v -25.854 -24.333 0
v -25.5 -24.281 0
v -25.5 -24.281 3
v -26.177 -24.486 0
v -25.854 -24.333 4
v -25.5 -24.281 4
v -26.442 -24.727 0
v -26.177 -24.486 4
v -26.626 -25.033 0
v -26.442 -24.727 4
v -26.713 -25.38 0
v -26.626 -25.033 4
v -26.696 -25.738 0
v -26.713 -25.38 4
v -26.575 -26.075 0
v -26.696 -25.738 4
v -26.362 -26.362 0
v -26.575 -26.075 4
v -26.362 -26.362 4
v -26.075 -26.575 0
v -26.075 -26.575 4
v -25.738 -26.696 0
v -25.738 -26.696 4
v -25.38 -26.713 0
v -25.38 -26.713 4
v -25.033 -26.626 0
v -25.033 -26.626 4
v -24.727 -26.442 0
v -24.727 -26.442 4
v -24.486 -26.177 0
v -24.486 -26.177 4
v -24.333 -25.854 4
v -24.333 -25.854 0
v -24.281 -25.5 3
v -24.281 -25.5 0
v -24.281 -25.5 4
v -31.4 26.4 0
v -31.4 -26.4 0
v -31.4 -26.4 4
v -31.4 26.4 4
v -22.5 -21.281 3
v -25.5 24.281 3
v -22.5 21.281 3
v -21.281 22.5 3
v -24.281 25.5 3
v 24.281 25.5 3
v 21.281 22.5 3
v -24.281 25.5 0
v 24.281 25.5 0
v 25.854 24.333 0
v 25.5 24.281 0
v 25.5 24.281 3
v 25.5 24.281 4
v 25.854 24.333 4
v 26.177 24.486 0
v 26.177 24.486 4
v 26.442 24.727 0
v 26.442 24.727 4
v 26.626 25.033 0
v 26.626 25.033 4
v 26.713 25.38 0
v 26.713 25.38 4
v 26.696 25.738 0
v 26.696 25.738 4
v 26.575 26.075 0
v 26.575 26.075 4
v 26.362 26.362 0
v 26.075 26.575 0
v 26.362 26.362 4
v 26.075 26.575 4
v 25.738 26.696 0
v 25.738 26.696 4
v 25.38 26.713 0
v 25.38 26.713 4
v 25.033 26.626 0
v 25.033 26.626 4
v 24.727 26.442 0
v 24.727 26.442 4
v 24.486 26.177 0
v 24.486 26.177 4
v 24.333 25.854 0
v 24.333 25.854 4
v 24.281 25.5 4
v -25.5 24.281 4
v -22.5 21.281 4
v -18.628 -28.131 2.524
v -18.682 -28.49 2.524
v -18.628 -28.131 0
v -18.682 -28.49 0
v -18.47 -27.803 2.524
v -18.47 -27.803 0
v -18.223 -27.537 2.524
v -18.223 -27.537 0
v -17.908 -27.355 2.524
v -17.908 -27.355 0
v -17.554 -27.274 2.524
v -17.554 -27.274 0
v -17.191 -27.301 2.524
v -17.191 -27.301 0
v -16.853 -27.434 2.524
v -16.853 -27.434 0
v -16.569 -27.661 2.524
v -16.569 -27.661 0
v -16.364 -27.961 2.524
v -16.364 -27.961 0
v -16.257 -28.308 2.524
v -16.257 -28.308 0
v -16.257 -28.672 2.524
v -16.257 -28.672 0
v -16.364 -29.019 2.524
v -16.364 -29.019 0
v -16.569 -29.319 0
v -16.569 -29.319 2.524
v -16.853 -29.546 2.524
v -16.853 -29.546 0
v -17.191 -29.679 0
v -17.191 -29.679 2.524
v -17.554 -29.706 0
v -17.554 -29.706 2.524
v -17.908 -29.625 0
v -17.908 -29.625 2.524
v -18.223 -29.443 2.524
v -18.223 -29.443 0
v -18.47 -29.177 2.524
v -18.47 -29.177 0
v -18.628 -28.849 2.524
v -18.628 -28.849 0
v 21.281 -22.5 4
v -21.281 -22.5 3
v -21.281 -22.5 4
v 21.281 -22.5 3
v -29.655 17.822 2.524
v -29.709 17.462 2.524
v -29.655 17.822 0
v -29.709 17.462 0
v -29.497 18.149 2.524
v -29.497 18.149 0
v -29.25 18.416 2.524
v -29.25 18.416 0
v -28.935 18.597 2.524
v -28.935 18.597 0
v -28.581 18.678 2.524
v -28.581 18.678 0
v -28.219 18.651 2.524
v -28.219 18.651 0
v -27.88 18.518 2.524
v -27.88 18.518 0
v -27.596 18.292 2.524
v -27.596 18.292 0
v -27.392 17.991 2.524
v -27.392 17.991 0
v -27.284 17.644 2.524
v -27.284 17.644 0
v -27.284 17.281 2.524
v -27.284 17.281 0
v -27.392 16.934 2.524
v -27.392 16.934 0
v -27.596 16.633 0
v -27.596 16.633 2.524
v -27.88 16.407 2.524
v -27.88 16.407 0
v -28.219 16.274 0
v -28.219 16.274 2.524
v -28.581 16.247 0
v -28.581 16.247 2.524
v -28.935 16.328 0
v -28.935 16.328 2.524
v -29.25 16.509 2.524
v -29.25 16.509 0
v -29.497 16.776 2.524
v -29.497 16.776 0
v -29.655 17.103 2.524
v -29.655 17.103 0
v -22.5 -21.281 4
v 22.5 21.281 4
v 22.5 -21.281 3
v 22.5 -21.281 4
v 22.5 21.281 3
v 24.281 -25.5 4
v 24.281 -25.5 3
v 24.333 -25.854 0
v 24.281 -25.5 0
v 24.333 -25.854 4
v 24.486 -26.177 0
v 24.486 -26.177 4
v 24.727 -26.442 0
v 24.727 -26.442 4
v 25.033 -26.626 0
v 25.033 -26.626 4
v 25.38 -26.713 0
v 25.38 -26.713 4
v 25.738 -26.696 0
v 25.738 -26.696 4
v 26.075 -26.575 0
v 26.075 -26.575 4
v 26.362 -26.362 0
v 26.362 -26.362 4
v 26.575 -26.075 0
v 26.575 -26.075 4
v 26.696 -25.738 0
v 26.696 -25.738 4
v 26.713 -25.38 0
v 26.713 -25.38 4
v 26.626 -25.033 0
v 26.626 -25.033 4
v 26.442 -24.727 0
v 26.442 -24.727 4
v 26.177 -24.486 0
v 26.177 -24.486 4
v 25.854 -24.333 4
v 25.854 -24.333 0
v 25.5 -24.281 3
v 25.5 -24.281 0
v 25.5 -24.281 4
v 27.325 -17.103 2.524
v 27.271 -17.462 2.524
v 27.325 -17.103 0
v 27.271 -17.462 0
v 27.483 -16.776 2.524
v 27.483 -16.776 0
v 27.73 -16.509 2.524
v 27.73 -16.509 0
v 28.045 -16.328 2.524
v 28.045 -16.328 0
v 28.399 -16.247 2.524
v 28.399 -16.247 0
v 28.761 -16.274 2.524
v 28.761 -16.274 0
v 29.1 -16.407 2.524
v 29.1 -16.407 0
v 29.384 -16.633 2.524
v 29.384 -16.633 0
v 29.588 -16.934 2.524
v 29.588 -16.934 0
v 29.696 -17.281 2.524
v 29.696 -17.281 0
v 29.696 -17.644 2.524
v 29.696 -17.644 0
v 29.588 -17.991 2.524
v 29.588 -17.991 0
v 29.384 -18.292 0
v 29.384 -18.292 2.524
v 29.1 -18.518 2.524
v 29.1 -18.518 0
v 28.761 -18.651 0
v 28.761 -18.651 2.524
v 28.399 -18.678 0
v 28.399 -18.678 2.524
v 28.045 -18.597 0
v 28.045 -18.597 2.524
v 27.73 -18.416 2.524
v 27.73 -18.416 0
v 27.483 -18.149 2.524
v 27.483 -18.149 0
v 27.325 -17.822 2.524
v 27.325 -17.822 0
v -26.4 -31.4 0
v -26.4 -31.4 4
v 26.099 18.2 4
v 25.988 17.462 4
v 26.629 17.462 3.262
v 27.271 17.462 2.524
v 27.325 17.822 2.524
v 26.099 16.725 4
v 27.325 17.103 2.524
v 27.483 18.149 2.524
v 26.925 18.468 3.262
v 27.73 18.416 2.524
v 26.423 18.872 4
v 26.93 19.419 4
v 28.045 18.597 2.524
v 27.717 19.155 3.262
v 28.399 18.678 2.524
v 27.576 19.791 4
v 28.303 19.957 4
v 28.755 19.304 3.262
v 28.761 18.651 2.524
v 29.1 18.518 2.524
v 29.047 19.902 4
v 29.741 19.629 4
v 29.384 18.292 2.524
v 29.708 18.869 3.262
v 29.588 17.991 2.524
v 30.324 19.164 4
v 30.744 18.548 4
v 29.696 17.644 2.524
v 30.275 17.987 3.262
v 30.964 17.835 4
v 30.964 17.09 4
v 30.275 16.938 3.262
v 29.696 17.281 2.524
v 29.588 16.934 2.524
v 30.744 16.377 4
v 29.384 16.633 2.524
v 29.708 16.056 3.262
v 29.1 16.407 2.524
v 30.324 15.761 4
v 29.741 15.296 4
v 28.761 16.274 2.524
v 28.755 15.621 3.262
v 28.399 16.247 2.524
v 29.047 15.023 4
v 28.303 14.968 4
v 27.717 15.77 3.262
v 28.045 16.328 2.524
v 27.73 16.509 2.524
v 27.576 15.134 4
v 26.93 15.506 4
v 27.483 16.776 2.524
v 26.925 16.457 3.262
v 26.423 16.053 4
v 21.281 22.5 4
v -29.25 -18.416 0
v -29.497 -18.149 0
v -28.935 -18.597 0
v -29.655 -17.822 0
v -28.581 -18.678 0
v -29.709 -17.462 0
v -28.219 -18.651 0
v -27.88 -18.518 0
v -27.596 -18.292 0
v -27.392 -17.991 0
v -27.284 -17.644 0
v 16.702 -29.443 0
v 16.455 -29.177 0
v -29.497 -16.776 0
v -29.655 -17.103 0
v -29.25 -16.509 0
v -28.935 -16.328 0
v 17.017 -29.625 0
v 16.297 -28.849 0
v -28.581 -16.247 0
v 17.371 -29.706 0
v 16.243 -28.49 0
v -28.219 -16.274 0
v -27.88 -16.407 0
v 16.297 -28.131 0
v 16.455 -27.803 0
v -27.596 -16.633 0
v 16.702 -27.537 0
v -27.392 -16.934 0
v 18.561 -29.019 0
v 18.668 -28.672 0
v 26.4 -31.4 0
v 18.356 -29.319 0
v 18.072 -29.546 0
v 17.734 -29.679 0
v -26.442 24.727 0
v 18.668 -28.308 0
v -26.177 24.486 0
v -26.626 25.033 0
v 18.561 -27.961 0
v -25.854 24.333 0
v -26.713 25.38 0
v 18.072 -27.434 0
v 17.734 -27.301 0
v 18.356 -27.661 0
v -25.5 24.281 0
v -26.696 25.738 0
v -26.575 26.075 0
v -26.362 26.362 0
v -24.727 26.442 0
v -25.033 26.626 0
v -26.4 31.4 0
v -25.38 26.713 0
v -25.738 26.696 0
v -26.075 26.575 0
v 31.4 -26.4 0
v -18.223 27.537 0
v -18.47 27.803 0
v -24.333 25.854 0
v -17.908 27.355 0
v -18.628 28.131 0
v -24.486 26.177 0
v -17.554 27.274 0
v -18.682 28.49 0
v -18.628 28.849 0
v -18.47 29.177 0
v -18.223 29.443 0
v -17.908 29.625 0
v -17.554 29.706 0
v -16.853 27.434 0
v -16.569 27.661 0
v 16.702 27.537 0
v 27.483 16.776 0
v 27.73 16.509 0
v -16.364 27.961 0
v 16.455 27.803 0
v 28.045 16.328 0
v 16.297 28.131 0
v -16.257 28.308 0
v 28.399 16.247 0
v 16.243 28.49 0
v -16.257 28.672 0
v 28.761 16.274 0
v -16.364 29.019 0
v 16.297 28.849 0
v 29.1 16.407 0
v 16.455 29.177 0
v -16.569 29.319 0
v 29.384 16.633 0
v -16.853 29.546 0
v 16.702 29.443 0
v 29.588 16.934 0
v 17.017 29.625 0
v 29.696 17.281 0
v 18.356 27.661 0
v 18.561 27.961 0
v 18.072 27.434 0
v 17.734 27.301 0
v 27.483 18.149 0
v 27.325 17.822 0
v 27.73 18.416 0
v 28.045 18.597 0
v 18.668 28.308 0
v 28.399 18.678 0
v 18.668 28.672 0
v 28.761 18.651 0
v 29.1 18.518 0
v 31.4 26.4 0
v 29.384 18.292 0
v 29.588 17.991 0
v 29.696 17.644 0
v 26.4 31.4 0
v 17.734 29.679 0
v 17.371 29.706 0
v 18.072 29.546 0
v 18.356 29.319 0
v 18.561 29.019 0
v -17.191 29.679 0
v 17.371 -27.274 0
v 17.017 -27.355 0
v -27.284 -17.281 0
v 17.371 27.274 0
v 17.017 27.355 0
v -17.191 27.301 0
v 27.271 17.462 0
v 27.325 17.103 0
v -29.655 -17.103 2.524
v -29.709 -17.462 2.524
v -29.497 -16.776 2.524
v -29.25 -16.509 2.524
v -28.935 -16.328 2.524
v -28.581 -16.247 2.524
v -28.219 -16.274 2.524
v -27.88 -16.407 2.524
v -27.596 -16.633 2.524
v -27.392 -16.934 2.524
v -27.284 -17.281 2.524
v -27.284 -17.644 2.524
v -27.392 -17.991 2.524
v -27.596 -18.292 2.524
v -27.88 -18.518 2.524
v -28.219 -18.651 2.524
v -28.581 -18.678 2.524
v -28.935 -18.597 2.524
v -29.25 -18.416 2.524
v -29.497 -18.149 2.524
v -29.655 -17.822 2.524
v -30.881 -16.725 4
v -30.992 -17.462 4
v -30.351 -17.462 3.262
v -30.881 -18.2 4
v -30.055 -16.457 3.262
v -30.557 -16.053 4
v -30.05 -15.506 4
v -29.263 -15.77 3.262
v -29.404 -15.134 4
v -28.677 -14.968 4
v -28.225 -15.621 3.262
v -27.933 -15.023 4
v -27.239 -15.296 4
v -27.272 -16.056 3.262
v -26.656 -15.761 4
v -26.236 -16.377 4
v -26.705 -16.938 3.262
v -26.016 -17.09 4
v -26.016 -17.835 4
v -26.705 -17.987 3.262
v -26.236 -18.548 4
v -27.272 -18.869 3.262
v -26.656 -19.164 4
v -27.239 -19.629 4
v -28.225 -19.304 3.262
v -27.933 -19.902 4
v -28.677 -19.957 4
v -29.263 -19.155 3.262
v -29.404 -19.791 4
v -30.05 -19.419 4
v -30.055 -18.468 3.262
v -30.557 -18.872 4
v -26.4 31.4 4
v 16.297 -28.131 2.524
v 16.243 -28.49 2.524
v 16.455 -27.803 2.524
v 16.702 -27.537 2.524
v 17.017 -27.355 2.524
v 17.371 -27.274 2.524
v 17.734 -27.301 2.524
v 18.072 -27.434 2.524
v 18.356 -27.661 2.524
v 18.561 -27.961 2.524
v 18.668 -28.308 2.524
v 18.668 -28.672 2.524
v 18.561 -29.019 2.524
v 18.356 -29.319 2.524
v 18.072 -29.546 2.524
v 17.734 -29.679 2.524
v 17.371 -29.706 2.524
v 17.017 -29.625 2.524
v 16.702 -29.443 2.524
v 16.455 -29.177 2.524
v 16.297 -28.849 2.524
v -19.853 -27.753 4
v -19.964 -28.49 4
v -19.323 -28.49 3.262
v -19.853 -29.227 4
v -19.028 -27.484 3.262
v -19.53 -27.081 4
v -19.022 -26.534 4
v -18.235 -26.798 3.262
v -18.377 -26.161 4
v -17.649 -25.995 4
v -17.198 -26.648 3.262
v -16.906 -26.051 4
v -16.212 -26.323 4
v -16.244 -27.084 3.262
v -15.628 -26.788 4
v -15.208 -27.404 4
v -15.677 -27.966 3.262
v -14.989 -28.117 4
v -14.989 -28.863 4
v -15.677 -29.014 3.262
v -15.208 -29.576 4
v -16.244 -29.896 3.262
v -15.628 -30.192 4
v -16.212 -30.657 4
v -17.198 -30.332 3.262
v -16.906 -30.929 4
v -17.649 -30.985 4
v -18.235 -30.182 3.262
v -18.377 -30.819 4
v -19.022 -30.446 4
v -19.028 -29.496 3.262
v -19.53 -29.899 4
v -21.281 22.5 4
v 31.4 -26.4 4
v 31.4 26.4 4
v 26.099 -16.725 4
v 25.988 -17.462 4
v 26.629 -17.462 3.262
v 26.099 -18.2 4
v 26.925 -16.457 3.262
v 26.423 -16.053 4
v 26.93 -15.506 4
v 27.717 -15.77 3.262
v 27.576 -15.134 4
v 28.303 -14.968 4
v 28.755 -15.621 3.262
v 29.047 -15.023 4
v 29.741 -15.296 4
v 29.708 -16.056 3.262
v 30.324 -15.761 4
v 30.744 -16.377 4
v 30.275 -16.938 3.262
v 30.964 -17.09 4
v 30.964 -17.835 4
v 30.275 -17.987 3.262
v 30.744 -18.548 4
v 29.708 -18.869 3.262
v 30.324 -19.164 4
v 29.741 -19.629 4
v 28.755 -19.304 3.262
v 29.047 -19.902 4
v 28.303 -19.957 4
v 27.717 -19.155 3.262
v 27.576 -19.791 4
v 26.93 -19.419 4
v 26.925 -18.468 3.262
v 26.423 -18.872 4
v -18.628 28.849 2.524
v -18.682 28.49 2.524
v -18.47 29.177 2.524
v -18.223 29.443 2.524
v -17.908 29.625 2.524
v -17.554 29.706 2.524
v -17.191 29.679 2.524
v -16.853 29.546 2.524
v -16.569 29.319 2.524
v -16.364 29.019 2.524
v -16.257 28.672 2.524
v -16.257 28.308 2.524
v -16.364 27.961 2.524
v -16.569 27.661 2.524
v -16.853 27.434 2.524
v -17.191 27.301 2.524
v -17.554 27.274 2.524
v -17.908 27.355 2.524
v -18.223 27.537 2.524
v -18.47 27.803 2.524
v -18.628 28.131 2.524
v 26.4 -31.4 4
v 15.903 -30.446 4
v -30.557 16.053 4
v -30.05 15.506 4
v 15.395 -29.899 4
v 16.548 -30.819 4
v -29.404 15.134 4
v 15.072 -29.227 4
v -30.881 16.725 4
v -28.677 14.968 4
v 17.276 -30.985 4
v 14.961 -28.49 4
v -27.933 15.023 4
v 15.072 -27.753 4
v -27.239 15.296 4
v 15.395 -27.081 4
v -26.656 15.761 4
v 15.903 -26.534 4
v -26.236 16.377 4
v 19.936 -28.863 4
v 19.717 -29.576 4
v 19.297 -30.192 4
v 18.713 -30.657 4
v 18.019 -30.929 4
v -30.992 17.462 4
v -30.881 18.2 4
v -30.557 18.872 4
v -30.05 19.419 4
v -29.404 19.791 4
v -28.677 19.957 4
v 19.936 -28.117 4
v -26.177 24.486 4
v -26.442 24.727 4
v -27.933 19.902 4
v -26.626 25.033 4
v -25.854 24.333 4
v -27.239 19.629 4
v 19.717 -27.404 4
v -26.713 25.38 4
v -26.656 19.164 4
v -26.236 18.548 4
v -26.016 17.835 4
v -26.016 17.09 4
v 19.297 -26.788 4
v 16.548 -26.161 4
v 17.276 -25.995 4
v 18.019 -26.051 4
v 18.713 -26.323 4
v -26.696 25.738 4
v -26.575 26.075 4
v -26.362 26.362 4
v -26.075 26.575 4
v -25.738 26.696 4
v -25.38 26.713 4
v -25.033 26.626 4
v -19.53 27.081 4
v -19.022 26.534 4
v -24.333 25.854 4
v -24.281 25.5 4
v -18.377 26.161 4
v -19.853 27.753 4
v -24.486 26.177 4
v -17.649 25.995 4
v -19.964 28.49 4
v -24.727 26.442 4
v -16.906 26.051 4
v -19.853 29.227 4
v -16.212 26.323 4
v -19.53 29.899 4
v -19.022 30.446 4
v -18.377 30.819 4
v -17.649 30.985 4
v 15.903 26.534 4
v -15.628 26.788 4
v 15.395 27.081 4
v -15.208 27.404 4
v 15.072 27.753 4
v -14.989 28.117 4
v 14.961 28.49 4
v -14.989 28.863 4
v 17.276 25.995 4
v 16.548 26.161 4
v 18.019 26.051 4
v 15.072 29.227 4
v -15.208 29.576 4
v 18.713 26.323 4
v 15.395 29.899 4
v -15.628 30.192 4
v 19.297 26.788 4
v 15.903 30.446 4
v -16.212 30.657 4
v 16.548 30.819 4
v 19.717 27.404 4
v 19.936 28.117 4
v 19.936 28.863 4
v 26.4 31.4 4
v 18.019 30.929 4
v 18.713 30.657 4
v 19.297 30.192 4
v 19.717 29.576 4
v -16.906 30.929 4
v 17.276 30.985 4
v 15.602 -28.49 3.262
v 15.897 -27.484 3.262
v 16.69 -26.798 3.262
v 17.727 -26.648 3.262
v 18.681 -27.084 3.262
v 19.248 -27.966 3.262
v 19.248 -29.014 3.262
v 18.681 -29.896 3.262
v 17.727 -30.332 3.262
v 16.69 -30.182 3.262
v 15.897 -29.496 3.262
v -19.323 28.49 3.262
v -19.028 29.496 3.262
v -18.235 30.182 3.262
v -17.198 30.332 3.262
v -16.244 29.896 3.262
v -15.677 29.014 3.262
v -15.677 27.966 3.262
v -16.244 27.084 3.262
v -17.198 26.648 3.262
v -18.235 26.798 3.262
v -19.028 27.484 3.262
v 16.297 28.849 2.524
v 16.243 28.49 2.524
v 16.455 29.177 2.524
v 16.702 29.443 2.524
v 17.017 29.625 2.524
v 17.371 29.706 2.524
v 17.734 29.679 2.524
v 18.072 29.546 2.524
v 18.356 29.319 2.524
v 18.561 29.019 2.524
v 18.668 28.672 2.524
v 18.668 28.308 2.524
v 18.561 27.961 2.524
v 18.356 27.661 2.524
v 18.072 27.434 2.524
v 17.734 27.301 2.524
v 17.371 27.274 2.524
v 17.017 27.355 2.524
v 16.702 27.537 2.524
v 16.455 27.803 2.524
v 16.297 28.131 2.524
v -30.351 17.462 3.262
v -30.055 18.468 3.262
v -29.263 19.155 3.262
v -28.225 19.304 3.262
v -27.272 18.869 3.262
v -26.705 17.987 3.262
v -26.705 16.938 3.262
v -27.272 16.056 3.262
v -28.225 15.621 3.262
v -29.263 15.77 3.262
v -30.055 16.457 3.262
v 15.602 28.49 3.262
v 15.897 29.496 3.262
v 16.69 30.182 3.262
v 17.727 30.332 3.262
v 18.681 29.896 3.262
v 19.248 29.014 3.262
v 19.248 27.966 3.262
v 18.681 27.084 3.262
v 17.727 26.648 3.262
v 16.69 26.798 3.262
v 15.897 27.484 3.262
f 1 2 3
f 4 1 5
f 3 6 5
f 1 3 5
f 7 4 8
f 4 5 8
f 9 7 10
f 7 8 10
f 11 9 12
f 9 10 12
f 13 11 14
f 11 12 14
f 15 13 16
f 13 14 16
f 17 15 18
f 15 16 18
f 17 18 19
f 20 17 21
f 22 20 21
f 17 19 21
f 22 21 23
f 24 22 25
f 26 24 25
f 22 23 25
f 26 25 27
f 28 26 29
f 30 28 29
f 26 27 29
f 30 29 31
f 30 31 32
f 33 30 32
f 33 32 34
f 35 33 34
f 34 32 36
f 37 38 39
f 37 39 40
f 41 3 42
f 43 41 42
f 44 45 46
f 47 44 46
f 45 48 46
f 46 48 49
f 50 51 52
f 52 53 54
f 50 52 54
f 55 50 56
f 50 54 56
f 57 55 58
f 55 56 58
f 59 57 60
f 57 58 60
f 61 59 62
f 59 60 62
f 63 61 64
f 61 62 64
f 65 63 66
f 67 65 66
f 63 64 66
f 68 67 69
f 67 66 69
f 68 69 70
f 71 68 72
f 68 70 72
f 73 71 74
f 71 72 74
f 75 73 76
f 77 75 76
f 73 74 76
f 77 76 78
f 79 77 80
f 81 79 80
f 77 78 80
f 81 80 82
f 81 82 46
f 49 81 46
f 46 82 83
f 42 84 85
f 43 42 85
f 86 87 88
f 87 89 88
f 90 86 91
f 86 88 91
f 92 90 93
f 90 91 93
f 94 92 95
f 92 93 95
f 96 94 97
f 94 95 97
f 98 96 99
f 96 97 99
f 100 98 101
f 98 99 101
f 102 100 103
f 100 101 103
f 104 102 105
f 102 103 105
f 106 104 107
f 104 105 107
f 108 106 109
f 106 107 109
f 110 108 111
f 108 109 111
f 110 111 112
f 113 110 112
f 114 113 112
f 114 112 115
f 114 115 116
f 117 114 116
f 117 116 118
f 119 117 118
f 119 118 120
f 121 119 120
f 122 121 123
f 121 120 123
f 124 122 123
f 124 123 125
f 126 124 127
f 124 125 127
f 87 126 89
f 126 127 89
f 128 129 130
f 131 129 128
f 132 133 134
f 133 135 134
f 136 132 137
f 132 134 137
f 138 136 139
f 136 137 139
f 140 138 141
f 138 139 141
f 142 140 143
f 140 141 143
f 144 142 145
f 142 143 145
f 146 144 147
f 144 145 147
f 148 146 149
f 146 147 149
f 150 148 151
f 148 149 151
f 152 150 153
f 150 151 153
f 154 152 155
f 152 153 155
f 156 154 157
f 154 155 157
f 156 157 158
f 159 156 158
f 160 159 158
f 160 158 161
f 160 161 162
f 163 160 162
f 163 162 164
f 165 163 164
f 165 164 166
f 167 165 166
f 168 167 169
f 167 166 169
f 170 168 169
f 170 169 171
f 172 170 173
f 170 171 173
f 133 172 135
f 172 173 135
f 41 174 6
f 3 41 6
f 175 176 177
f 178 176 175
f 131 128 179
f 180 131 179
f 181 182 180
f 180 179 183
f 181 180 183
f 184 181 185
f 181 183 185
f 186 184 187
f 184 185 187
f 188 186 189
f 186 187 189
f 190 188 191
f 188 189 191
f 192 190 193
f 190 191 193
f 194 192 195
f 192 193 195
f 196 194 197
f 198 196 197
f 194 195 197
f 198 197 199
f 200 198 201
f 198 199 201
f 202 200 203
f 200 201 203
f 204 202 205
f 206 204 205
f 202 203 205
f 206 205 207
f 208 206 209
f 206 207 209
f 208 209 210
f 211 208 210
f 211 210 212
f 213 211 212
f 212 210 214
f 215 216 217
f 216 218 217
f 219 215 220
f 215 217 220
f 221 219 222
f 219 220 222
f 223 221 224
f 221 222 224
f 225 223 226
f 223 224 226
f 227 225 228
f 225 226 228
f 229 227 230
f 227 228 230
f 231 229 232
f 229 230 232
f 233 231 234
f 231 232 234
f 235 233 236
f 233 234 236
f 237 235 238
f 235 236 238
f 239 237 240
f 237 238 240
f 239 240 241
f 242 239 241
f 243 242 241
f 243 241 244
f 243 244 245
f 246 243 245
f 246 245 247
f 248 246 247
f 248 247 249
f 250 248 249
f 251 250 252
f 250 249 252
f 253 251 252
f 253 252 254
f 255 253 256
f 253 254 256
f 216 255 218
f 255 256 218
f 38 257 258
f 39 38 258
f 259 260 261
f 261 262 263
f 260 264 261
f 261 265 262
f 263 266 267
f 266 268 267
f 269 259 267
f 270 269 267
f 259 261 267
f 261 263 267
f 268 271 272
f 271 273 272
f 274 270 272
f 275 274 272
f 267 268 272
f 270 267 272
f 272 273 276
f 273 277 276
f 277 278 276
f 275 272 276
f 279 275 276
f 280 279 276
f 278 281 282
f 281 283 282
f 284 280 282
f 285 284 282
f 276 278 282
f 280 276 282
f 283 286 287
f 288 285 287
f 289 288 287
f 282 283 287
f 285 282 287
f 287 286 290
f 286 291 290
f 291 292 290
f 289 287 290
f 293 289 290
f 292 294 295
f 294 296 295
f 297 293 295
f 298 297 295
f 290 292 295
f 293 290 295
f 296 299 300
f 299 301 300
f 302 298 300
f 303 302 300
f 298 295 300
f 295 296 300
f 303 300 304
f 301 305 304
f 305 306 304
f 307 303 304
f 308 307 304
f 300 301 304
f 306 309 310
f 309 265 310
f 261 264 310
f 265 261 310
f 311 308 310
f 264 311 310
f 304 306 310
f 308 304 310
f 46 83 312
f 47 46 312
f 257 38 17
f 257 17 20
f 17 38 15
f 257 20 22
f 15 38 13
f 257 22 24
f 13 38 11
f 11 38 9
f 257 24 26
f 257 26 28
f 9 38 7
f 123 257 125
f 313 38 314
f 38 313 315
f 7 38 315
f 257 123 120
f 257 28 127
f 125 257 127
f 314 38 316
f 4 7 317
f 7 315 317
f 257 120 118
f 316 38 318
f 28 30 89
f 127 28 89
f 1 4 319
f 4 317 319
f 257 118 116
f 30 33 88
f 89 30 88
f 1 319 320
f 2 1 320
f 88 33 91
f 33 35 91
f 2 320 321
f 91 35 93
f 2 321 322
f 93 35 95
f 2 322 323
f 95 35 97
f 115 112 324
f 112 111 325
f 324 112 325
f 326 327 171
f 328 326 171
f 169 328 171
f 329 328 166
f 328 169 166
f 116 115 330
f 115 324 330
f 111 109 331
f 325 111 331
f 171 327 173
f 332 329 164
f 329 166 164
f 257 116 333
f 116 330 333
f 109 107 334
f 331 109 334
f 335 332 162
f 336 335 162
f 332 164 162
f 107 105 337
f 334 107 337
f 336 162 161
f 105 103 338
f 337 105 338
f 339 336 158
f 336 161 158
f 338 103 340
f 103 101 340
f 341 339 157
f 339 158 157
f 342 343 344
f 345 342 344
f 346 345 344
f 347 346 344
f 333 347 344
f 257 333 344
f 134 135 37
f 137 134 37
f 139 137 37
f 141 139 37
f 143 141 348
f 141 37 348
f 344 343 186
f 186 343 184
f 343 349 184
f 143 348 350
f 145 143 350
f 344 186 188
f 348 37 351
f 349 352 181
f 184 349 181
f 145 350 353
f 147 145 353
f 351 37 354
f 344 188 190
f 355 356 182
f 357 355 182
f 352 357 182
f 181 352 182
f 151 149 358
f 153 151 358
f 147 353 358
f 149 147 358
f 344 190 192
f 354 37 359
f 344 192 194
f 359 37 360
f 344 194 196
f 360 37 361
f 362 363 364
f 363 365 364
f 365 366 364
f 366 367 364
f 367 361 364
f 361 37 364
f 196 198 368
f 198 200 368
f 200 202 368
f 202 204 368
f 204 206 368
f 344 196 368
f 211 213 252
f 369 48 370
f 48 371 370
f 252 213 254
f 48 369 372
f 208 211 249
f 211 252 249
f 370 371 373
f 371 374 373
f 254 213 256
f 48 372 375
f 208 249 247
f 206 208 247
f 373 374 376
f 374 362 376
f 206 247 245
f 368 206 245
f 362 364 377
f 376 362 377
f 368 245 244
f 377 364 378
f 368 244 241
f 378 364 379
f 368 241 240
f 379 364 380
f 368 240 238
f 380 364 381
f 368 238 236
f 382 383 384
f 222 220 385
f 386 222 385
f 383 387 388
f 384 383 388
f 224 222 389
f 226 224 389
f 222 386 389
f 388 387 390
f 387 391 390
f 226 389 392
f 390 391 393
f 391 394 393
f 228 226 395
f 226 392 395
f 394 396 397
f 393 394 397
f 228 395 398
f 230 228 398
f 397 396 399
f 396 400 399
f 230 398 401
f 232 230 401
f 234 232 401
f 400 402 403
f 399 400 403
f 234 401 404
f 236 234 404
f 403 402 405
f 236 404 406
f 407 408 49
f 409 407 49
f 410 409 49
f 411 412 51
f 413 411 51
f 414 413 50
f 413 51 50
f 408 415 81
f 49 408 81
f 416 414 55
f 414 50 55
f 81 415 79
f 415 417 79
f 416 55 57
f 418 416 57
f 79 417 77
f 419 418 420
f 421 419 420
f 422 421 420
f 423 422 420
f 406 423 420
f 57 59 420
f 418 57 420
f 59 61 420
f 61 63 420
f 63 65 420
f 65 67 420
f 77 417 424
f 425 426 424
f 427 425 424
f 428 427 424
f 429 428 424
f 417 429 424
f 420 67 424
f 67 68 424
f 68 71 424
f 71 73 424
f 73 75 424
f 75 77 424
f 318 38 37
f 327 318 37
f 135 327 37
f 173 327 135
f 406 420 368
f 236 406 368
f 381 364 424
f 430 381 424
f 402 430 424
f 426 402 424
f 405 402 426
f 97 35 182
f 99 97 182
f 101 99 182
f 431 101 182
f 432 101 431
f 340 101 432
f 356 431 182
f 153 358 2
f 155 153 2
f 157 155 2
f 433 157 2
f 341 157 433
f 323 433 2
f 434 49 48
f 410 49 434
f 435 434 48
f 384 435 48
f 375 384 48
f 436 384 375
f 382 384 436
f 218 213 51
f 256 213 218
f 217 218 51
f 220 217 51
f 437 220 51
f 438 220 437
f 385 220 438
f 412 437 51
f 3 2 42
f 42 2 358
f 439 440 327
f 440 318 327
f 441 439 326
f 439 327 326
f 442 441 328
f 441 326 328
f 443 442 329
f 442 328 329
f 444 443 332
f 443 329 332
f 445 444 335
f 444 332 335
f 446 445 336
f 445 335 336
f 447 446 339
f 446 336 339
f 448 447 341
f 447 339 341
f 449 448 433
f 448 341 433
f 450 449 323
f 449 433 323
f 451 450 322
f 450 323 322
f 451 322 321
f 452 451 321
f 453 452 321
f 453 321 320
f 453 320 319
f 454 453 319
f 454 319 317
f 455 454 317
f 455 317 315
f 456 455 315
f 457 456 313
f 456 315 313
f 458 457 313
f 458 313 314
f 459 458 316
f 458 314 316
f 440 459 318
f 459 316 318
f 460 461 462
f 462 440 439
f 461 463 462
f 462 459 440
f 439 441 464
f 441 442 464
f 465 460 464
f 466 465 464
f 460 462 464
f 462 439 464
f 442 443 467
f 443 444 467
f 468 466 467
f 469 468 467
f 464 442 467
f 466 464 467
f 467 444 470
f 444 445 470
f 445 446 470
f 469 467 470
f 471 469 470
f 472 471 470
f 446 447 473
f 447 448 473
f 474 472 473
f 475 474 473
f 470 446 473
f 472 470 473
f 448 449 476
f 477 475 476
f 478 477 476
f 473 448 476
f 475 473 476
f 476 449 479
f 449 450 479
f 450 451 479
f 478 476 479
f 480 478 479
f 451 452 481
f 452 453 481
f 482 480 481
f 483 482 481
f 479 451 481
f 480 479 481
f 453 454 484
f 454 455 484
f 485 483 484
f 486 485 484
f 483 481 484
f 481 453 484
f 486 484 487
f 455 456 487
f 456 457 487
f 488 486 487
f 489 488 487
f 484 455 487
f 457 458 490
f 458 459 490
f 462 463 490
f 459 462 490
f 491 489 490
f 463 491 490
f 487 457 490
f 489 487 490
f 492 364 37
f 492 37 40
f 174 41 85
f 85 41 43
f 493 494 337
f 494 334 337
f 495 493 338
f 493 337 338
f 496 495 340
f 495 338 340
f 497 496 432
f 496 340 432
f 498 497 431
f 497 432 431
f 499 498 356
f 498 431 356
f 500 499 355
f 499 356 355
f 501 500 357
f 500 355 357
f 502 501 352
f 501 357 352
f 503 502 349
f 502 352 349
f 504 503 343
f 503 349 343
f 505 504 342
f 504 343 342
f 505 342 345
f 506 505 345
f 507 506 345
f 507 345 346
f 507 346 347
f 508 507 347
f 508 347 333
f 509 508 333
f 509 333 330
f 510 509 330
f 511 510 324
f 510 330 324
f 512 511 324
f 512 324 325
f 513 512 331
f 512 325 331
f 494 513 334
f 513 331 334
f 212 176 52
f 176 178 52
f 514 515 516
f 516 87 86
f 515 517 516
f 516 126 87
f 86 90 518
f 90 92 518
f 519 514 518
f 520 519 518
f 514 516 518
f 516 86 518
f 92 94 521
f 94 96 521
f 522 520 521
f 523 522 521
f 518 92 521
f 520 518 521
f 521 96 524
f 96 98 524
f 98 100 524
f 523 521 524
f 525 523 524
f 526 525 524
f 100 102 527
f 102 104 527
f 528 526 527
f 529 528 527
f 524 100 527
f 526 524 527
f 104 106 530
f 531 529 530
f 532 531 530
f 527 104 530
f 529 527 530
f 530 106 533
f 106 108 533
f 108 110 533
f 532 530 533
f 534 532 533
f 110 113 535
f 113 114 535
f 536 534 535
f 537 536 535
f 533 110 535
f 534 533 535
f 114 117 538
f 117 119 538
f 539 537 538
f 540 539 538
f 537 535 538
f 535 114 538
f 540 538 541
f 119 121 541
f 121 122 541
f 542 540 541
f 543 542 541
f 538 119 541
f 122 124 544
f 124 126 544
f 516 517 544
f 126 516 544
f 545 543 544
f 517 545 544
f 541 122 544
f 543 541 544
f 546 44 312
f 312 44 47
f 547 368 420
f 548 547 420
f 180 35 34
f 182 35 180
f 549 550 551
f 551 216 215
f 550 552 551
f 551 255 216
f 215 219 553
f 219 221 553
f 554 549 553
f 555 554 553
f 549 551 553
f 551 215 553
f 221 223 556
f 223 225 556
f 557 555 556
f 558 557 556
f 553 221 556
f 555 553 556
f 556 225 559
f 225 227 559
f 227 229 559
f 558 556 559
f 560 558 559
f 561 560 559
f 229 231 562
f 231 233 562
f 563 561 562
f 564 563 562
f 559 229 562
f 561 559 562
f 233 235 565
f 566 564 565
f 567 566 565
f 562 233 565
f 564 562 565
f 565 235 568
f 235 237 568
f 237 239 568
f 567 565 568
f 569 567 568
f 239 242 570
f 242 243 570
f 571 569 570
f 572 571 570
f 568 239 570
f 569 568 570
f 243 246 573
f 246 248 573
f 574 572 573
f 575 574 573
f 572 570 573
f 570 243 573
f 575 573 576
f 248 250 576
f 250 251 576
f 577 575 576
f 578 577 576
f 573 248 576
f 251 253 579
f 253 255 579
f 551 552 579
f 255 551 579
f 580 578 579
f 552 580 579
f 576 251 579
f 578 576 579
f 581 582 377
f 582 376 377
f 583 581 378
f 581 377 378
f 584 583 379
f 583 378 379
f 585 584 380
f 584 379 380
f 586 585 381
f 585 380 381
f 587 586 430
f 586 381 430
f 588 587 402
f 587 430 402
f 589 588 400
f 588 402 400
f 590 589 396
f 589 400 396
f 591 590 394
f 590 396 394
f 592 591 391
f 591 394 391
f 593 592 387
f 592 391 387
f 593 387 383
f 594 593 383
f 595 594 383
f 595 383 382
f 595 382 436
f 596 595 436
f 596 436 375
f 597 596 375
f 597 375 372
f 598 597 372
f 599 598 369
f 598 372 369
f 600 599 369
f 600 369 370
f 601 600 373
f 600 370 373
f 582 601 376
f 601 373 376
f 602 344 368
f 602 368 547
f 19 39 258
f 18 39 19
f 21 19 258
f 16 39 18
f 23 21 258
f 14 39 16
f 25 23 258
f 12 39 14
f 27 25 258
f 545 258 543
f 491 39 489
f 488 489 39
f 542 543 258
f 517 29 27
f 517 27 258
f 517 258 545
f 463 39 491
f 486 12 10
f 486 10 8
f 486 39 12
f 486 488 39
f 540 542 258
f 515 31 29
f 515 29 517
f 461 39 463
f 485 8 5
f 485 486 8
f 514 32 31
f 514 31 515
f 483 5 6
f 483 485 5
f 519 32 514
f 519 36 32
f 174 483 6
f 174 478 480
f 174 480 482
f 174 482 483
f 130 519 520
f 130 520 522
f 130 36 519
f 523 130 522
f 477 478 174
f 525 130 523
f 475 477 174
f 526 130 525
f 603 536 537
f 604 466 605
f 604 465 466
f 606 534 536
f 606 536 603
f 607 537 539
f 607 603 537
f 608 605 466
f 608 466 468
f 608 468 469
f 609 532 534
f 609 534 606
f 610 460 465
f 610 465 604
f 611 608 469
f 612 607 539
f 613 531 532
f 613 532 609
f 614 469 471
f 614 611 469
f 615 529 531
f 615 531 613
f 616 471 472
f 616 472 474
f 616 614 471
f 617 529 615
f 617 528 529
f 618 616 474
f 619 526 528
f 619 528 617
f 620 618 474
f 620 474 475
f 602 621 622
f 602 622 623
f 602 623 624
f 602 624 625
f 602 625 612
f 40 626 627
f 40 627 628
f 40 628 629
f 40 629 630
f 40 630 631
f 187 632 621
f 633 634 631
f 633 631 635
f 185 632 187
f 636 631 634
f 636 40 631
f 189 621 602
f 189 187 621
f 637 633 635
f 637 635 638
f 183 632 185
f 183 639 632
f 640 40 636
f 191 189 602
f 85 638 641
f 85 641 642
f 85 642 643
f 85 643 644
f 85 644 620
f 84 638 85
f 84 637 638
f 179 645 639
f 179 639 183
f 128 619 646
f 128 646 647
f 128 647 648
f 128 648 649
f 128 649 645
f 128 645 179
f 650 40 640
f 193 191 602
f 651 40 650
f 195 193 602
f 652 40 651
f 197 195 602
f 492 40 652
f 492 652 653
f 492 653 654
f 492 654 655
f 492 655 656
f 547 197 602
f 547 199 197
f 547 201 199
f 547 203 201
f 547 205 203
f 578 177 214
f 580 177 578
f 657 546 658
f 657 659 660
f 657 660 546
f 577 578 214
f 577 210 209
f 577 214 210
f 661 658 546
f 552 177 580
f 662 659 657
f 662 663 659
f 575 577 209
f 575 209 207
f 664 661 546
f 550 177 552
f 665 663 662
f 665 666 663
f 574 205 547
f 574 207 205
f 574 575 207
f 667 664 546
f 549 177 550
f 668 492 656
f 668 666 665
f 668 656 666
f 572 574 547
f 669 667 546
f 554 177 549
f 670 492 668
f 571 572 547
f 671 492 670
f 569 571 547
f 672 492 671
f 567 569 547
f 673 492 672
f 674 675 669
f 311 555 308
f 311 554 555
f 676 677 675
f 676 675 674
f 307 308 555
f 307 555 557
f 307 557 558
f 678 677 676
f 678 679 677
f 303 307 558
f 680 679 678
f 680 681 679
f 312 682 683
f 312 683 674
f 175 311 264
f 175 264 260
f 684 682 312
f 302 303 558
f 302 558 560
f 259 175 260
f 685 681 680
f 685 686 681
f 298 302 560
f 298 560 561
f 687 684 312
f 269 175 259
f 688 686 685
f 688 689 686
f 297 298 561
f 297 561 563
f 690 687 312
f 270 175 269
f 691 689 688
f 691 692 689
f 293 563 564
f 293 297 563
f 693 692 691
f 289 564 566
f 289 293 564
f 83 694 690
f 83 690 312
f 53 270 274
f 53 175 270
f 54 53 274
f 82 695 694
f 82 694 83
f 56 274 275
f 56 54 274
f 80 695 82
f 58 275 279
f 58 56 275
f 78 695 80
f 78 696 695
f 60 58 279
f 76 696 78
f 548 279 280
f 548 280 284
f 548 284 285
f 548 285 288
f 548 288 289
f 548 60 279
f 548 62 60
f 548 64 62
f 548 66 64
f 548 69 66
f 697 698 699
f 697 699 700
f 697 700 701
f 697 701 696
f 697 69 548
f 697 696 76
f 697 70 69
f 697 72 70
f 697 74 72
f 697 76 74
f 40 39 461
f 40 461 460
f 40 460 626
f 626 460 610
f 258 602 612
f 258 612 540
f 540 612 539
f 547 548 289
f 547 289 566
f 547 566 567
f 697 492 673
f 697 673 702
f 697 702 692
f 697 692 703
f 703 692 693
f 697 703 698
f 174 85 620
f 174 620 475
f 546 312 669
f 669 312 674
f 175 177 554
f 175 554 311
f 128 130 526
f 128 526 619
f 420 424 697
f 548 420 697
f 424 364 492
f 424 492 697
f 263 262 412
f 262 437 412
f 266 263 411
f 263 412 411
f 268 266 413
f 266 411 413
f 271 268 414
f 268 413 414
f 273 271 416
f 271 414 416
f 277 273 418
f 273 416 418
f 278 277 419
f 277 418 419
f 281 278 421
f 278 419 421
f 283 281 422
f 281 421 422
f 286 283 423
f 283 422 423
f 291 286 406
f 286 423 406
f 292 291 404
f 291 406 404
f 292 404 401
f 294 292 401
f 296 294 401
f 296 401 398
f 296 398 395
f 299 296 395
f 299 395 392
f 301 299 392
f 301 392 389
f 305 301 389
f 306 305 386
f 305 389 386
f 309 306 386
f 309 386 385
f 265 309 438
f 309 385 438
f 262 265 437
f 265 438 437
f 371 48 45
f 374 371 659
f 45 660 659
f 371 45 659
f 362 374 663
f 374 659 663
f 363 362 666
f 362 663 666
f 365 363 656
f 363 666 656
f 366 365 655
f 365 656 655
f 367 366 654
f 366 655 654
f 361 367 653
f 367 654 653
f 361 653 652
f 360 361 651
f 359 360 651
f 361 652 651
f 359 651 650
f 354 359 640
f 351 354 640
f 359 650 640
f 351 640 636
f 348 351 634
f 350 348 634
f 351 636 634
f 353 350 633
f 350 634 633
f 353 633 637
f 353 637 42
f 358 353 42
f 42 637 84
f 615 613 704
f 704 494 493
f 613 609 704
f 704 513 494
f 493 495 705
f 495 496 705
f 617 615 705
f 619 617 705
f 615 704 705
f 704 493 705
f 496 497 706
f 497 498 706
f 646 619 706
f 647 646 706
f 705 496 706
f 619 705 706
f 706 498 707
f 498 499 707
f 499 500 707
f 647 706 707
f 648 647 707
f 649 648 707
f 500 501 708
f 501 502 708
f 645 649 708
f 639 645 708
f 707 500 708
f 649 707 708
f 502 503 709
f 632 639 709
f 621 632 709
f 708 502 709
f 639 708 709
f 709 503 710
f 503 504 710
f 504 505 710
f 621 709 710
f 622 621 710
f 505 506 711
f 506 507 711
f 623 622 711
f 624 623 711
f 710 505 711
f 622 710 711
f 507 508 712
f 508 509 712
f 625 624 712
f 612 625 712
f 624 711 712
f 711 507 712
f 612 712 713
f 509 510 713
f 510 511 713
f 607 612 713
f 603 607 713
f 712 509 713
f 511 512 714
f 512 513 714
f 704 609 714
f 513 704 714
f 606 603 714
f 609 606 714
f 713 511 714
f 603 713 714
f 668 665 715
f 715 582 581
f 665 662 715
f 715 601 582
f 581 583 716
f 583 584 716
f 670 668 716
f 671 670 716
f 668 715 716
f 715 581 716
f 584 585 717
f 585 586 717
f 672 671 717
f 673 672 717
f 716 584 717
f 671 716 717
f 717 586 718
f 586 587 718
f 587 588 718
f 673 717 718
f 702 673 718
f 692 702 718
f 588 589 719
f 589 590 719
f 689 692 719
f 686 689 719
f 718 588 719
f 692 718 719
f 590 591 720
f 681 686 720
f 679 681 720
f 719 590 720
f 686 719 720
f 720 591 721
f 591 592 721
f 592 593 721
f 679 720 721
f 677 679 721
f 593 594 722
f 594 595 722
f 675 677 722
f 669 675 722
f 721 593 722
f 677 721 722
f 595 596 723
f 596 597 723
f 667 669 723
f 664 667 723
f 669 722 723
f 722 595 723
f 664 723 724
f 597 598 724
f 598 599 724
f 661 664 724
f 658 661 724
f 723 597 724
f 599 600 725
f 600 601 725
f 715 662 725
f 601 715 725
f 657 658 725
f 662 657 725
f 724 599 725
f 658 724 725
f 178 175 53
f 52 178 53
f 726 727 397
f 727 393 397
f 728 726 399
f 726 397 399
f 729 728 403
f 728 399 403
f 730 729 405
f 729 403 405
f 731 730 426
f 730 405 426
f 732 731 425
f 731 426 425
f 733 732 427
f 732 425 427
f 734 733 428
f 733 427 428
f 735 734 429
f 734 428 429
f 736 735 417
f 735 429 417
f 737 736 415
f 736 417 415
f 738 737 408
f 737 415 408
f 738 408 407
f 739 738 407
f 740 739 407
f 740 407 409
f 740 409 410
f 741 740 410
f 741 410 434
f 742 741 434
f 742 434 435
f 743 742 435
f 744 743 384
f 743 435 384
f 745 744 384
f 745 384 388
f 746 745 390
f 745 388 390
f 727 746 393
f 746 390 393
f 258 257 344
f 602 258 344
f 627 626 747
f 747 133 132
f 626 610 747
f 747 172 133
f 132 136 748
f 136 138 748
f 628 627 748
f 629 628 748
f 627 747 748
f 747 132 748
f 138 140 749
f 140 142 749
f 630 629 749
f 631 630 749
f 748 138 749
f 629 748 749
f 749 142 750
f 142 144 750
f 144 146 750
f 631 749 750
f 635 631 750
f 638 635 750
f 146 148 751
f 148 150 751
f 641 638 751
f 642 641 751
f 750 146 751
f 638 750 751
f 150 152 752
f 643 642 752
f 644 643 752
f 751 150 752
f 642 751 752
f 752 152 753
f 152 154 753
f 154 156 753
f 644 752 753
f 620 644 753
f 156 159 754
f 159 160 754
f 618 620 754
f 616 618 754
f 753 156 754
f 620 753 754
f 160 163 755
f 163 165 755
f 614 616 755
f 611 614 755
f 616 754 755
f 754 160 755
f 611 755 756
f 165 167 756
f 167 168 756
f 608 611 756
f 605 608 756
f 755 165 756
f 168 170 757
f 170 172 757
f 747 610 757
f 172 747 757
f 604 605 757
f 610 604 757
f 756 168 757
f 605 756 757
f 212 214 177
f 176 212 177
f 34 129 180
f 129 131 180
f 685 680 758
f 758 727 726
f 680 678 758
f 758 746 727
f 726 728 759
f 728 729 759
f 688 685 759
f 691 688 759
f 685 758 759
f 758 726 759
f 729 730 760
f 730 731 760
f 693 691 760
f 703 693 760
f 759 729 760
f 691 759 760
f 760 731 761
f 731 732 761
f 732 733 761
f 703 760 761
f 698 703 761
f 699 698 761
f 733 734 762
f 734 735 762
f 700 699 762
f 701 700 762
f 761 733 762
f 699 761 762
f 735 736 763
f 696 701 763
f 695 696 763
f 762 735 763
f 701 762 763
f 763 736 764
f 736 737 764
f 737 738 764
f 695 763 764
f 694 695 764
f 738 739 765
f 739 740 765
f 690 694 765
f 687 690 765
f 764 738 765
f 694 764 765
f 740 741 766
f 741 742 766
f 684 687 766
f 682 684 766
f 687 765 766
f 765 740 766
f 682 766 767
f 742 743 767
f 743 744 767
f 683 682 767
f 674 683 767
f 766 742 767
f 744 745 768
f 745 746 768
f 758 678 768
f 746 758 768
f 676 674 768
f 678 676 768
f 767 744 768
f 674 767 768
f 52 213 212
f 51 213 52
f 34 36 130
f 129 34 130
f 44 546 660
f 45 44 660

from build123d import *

# Parameters (mm, degrees)
F0_W           = 62.8
F0_H           = 62.8
F0_W_2         = 51
F0_H_2         = 51
F0_W_3         = 45
F0_H_3         = 45
F1_DEPTH       = 4
F2_DEPTH       = 3
F4_D           = 2.4384
F4_DEPTH       = 20
F4_CSINK_D     = 5.0038
F4_CSINK_ANGLE = 82
F4_TIP         = 0.7325692667
F5_D           = 2.4384
F5_DEPTH       = 20
F5_START       = 3
F5_TIP         = 0.7325692667
F7_DEPTH       = 4.001
F8_SIZE        = 5


with BuildPart() as f1:
    # F0 (on Top) → F1 (new body)
    with BuildSketch(Plane.XY):
        Rectangle(F0_W, F0_H)
        Rectangle(F0_W_2, F0_H_2, mode=Mode.SUBTRACT)
        Rectangle(F0_W_2, F0_H_2)
        Rectangle(F0_W_3, F0_H_3, mode=Mode.SUBTRACT)
    extrude(amount=F1_DEPTH)

    # F0 (on Top) → F2 (cut)
    with BuildSketch(Plane.XY):
        Rectangle(F0_W_2, F0_H_2)
        Rectangle(F0_W_3, F0_H_3, mode=Mode.SUBTRACT)
    extrude(amount=F2_DEPTH, mode=Mode.SUBTRACT)

    # F4
    with Locations(Plane.XY.offset(4)):
        with Locations((-17.4625, -28.49), (-28.49, -17.4625), (-28.49, 17.4625), (-17.4625, 28.49), (17.4625, 28.49), (28.49, 17.4625), (28.49, -17.4625), (17.4625, -28.49)):
            CounterSinkHole(F4_D / 2, F4_CSINK_D / 2, depth=F4_DEPTH, counter_sink_angle=F4_CSINK_ANGLE)
            with Locations((0, 0, -(F4_DEPTH + F4_TIP / 2))):  # 118° drill point
                Cone(0, F4_D / 2, F4_TIP, mode=Mode.SUBTRACT)

    # F5
    # its depths count from where the whole tool has entered the part; down to there all is cleared
    with Locations(Plane(origin=(0, 0, 0), x_dir=(1, 0, 0), z_dir=(0, 0, -1)).offset(-F5_START)):
        with Locations((-25.5, -25.5), (25.5, -25.5), (-25.5, 25.5), (25.5, 25.5)):
            Hole(F5_D / 2, depth=F5_DEPTH)
            with Locations((0, 0, -(F5_DEPTH + F5_TIP / 2))):  # 118° drill point
                Cone(0, F5_D / 2, F5_TIP, mode=Mode.SUBTRACT)

    # F6 (on face) → F7 (cut, through all)
    with BuildSketch(Plane.XY.offset(4)):
        with BuildLine():
            Line((-21.2808, 22.5), (-24.2808, 25.5))
            ThreePointArc((-24.2808, 25.5), (-24.6378954124, 24.6378954124), (-25.5, 24.2808))
            Line((-25.5, 24.2808), (-22.5, 21.2808))
            Line((-22.5, 21.2808), (-22.5, 22.5))
            Line((-22.5, 22.5), (-21.2808, 22.5))
        make_face()
        with BuildLine():
            Line((22.5, 21.2808), (25.5, 24.2808))
            ThreePointArc((25.5, 24.2808), (24.6378954124, 24.6378954124), (24.2808, 25.5))
            Line((24.2808, 25.5), (21.2808, 22.5))
            Line((21.2808, 22.5), (22.5, 22.5))
            Line((22.5, 22.5), (22.5, 21.2808))
        make_face()
        with BuildLine():
            ThreePointArc((-25.5, -24.2808), (-24.6378954124, -24.6378954124), (-24.2808, -25.5))
            Line((-24.2808, -25.5), (-21.2808, -22.5))
            Line((-21.2808, -22.5), (-22.5, -22.5))
            Line((-22.5, -22.5), (-22.5, -21.2808))
            Line((-22.5, -21.2808), (-25.5, -24.2808))
        make_face()
        with BuildLine():
            ThreePointArc((24.2808, -25.5), (24.6378954124, -24.6378954124), (25.5, -24.2808))
            Line((25.5, -24.2808), (22.5, -21.2808))
            Line((22.5, -21.2808), (22.5, -22.5))
            Line((22.5, -22.5), (21.2808, -22.5))
            Line((21.2808, -22.5), (24.2808, -25.5))
        make_face()
    extrude(amount=-F7_DEPTH, mode=Mode.SUBTRACT)

    # F8
    f8_edges = [f1.edges().sort_by_distance(p)[0] for p in [
        (31.4, -31.4, 2),
        (-31.4, -31.4, 2),
        (-31.4, 31.4, 2),
        (31.4, 31.4, 2),
    ]]
    chamfer(f8_edges, length=F8_SIZE)


solid = f1.part
